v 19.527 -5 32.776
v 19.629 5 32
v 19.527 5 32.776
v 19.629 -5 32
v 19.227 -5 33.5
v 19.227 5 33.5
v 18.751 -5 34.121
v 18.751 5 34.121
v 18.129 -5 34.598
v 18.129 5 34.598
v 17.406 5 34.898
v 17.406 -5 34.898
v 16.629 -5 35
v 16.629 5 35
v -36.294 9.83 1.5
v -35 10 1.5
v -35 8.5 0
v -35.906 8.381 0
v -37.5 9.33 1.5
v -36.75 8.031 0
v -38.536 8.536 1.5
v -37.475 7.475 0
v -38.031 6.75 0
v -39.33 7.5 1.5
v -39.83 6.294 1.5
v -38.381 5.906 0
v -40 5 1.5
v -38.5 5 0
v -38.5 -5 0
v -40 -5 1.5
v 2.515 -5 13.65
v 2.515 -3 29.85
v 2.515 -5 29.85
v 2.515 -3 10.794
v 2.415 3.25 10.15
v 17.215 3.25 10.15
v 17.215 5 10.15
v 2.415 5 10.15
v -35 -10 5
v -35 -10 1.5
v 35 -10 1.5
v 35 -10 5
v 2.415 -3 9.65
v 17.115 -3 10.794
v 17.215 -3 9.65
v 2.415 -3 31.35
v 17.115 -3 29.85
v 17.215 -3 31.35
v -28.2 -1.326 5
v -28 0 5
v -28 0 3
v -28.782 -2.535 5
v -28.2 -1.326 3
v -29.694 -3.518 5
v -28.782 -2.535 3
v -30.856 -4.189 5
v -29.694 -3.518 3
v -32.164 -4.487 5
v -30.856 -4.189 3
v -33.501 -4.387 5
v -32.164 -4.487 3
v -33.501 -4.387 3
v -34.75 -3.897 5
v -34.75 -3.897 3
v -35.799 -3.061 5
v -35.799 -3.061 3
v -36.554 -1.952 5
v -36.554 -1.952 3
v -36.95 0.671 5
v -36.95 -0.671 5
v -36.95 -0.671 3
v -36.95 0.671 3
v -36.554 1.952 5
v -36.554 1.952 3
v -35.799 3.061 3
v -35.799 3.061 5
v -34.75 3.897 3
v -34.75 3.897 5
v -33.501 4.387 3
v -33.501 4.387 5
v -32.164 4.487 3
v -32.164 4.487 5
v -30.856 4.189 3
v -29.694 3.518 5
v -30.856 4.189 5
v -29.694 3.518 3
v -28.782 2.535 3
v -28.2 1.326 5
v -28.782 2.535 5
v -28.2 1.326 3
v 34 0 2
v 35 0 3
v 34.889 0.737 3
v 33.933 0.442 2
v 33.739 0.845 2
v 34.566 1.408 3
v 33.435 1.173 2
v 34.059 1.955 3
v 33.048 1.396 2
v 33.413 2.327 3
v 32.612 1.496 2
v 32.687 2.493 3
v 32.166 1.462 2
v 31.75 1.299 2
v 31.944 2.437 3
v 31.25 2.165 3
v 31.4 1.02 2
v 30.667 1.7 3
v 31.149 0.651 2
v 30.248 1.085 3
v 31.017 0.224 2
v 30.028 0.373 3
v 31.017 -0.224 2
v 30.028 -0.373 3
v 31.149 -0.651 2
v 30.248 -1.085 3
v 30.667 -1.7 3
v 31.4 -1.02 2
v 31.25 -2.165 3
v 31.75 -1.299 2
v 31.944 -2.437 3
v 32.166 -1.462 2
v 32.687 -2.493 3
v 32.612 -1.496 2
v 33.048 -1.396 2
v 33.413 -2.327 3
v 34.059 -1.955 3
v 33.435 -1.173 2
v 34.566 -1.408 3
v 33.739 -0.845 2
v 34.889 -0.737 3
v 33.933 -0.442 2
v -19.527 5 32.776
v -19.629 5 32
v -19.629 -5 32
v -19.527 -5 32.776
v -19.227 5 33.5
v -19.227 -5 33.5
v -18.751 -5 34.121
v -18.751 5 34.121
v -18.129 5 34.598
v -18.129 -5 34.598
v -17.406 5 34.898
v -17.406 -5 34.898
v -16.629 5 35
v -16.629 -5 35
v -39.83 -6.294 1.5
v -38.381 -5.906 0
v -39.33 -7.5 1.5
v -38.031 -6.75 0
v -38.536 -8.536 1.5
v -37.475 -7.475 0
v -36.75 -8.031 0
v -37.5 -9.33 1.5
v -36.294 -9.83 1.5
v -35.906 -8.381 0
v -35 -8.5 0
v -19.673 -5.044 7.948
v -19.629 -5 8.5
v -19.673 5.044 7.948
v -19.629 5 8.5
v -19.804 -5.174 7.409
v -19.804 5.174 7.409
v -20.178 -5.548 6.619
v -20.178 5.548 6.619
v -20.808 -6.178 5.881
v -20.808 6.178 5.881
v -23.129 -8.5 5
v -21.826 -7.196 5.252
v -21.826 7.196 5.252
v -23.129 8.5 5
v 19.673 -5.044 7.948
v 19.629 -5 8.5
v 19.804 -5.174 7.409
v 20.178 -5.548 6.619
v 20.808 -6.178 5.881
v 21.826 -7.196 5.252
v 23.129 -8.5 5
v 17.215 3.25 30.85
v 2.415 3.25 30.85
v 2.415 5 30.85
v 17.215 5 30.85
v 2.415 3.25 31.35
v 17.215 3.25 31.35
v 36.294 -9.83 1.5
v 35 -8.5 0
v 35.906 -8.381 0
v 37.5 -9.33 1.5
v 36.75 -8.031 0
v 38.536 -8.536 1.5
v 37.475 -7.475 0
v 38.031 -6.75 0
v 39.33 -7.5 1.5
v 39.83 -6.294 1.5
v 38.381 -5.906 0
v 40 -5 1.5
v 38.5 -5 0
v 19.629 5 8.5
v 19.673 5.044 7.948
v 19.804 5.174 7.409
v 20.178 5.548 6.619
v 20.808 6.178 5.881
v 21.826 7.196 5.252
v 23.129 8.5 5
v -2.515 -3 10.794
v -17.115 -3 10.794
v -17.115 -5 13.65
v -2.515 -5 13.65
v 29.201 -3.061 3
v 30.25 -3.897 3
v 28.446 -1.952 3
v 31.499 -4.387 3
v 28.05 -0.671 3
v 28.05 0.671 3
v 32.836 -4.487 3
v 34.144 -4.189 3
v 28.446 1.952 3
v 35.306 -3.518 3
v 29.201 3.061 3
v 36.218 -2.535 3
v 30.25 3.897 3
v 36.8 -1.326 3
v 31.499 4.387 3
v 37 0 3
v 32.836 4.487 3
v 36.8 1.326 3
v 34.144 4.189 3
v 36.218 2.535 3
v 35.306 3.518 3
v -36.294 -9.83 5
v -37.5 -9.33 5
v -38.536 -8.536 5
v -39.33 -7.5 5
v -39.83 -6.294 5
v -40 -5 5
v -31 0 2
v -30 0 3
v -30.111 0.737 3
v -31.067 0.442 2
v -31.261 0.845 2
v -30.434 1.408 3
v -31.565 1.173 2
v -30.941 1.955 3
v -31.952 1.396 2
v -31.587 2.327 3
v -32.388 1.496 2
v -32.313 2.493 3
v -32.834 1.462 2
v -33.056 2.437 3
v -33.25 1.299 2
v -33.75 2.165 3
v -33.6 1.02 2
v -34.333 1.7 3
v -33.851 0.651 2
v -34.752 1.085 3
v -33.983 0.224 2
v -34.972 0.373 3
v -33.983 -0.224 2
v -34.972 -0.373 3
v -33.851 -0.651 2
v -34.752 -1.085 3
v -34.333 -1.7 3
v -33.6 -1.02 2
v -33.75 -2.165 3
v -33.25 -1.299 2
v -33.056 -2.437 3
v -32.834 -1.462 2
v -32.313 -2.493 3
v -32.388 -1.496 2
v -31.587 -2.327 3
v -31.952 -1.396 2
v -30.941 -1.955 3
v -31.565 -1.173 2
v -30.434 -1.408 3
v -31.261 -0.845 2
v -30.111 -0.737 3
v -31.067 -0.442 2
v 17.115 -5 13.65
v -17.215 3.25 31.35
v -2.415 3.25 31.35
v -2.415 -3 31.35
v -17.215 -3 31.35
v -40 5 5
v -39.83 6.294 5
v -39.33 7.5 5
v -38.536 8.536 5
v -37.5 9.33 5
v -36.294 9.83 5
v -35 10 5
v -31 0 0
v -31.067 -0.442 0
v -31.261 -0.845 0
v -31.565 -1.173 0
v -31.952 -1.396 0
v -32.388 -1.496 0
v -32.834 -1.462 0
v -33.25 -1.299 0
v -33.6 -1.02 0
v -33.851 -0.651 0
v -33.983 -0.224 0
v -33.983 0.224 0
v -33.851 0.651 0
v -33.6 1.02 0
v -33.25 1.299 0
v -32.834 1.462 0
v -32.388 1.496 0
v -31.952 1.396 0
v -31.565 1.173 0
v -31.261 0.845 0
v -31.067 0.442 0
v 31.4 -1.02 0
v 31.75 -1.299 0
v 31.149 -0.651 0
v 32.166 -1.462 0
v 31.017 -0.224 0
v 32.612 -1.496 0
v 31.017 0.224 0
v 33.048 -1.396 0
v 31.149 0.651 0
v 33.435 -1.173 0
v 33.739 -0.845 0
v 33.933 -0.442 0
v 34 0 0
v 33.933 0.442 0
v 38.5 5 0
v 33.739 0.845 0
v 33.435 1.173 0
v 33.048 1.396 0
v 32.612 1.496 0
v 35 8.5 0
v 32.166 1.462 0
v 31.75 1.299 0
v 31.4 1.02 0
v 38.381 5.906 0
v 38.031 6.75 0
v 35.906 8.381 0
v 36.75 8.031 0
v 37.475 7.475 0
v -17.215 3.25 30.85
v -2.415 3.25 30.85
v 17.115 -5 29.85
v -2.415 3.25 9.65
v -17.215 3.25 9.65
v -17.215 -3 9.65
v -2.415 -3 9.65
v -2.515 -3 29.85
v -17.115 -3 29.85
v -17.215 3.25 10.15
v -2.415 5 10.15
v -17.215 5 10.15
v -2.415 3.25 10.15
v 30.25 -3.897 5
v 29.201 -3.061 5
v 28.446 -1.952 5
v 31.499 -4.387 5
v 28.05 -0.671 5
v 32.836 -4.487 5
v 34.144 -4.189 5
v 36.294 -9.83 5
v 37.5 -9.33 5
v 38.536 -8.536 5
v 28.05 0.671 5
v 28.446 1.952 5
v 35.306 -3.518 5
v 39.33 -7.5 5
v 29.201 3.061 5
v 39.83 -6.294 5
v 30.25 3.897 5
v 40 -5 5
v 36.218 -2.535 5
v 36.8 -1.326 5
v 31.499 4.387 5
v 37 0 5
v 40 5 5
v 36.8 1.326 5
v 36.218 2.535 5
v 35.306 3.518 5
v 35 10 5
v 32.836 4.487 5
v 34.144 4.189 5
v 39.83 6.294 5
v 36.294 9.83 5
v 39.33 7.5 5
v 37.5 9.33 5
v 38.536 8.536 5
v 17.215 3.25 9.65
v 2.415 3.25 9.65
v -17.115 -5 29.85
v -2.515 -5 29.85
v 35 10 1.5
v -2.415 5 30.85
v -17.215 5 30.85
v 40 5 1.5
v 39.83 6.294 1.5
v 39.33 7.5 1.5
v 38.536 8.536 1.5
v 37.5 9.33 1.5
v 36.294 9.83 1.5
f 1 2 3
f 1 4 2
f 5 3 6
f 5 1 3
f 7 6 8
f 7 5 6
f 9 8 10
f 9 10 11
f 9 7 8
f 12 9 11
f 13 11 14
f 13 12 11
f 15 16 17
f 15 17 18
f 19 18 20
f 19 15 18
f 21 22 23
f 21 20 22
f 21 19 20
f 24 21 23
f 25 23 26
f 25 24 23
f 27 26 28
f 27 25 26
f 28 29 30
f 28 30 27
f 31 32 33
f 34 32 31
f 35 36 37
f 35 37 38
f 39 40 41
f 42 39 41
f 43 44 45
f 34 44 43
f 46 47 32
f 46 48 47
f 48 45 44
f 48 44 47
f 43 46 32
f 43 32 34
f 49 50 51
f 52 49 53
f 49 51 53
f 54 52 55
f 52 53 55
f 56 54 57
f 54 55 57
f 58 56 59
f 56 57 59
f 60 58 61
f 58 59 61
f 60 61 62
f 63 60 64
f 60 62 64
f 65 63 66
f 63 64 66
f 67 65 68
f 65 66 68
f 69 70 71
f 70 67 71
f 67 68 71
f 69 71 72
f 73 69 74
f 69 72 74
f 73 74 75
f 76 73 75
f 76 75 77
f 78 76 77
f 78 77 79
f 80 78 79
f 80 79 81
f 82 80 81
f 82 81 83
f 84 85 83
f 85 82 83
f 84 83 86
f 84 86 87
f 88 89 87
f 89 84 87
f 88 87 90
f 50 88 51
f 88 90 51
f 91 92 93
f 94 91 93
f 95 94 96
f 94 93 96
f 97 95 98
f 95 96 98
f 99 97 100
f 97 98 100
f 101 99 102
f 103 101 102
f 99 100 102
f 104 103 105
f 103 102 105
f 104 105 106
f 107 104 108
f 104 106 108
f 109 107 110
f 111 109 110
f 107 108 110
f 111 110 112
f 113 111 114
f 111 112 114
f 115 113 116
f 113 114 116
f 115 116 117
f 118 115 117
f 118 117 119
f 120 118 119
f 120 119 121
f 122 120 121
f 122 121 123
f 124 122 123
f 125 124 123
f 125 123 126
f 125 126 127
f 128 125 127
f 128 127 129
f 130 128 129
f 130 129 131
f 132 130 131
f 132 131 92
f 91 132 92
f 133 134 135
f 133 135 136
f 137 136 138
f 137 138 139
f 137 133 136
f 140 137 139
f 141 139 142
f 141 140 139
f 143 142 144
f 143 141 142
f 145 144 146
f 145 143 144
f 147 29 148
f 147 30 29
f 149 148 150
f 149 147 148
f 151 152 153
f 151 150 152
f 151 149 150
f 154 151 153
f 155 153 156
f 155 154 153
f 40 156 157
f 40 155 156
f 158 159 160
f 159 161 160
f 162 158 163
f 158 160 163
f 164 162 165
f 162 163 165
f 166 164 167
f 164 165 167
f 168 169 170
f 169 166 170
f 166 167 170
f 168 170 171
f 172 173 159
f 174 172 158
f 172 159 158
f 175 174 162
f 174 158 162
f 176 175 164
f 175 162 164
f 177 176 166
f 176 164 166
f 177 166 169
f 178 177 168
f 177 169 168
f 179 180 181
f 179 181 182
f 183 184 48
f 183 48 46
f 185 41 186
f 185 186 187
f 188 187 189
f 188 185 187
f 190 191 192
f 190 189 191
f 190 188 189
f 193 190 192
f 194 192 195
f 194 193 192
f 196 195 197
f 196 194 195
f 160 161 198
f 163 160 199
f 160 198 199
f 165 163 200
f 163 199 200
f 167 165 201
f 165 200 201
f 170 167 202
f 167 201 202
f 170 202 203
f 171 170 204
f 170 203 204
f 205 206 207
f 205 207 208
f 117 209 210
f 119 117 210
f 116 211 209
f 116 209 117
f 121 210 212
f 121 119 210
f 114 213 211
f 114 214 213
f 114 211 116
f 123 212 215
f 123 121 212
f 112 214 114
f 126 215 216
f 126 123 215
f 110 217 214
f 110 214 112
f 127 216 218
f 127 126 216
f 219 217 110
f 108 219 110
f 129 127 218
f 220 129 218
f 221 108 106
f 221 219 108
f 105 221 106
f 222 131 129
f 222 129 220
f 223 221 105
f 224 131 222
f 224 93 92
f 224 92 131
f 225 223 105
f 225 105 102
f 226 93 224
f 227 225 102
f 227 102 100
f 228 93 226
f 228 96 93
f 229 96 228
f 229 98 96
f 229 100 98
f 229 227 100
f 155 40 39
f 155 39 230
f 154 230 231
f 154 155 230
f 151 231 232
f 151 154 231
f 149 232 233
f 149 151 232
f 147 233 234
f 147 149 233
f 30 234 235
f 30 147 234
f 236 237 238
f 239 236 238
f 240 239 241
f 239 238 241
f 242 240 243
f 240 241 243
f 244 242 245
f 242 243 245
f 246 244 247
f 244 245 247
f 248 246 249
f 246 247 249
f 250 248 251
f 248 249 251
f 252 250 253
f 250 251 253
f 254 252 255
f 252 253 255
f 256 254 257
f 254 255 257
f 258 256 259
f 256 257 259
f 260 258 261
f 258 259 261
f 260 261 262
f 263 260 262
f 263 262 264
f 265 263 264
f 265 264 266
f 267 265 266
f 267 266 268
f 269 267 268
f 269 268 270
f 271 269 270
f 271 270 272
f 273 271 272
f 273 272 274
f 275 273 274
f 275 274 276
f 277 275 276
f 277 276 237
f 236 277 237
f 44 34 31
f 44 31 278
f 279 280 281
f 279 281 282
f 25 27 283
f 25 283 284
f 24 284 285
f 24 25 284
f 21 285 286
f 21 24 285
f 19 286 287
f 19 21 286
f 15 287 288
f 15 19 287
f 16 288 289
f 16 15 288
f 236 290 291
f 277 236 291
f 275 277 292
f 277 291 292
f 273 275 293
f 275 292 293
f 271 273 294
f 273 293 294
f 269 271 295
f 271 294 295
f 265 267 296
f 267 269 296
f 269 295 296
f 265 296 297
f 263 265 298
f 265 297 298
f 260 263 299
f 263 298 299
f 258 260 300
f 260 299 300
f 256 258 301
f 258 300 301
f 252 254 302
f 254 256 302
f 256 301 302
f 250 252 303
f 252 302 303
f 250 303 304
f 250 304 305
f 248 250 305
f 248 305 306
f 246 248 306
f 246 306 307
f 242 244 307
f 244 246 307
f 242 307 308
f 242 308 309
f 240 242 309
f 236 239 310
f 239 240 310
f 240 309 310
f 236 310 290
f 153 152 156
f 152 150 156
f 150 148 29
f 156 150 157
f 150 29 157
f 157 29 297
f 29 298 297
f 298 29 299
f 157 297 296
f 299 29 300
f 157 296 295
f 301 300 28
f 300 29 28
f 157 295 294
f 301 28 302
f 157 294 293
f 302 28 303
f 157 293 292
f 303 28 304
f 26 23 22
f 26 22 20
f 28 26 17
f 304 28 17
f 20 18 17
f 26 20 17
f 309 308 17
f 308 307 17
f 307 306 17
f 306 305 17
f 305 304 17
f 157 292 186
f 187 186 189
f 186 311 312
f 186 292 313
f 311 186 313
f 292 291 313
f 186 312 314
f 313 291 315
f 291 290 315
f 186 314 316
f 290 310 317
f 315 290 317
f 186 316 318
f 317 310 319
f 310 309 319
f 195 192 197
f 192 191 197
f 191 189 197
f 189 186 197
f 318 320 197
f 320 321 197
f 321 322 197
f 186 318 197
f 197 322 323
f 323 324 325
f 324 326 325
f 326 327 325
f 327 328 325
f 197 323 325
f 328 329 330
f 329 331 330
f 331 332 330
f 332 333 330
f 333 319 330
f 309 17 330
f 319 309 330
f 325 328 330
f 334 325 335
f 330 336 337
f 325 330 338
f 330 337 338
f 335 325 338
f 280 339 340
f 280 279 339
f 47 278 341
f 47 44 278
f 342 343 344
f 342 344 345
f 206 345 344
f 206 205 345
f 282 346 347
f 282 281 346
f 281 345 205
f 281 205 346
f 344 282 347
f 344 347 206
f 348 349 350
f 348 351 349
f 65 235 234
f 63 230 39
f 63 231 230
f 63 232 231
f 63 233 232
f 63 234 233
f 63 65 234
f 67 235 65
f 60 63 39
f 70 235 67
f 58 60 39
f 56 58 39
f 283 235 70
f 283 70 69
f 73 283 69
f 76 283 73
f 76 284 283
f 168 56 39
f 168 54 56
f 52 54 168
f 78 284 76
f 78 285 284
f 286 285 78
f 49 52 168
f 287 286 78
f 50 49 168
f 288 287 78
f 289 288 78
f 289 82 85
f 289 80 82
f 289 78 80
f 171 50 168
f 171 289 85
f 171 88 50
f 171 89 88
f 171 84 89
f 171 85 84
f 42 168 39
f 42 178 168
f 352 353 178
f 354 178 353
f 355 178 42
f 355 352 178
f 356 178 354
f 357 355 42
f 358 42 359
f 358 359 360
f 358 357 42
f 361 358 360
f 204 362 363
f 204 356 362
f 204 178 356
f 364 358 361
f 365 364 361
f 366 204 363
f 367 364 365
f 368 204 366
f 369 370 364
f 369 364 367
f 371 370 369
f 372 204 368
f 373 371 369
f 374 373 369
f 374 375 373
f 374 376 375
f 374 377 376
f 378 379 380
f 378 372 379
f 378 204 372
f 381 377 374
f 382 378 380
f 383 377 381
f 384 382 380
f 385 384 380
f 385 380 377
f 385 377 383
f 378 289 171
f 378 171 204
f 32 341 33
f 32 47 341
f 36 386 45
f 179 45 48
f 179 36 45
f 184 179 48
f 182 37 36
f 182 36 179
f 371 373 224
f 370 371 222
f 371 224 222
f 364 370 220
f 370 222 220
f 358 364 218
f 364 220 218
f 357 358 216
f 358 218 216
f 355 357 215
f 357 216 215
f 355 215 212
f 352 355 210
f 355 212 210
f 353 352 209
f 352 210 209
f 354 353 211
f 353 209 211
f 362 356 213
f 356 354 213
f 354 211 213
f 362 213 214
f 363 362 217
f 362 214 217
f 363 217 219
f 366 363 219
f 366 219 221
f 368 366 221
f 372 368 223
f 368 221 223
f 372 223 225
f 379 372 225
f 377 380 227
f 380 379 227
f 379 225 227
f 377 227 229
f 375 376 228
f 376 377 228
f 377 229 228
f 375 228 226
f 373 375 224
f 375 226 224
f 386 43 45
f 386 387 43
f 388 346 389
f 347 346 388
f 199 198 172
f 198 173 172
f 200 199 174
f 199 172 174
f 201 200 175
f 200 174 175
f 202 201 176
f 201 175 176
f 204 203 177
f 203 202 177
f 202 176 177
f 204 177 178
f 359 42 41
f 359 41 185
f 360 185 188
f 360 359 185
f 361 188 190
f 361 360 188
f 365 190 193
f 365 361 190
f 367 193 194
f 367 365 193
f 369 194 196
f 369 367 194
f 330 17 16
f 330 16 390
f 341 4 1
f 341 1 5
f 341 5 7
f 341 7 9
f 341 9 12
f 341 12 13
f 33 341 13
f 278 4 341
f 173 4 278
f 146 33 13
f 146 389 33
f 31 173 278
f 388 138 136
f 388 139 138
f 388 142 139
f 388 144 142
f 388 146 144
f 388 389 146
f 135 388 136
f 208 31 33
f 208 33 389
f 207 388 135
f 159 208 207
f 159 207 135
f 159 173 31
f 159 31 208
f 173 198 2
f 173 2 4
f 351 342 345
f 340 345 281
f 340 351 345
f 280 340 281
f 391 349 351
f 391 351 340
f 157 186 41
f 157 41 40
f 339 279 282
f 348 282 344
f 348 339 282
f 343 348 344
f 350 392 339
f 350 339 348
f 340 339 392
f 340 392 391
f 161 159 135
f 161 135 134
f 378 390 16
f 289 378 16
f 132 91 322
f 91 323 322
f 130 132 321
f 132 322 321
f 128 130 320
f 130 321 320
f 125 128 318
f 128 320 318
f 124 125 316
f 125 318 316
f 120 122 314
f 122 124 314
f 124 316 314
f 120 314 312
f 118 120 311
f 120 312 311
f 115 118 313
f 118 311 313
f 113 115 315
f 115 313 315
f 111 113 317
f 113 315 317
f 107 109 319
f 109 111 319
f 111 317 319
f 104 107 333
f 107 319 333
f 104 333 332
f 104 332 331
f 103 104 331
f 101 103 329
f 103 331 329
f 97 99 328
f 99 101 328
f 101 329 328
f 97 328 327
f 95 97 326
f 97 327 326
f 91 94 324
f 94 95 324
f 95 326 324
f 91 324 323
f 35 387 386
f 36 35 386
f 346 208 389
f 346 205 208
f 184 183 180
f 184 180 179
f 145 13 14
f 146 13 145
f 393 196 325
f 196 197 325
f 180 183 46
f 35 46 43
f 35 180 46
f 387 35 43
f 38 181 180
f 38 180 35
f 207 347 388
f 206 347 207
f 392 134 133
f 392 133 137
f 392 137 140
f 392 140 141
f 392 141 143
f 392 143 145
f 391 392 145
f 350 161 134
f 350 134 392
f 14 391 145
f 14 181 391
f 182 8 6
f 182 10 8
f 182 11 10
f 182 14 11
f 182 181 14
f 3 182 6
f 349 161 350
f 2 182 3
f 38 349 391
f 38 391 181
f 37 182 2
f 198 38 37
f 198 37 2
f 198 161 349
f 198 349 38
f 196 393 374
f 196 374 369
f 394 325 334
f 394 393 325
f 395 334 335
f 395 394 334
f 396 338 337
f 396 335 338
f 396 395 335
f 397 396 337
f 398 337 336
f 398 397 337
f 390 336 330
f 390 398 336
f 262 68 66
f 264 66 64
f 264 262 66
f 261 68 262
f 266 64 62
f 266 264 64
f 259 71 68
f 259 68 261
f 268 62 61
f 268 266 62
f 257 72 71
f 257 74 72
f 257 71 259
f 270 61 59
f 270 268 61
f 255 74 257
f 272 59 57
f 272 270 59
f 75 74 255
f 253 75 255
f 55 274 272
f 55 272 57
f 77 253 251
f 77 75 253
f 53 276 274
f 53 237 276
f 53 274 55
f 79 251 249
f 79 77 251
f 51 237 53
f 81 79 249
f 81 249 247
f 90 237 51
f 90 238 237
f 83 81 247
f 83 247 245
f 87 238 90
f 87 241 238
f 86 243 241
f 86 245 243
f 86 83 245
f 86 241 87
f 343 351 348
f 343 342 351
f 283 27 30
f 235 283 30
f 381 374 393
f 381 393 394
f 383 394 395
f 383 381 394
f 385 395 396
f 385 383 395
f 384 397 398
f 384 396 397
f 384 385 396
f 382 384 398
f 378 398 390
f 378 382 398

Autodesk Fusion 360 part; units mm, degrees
sketch "Sketch1" plane through (0, 0, 0) normal (0, 0, 1) x (1, 0, 0)
  line L0 (0, 0) -> (-25, 0) construction
  line L1 (0, 0) -> (25, 0) construction
  line L2 (25, 0) -> (25, 10)
  line L3 (25, 0) -> (25, -10)
  line L4 (25, 10) -> (-25, 10)
  line L5 (-25, 10) -> (-25, 0)
  line L6 (-25, 0) -> (-25, -10)
  line L7 (-25, -10) -> (25, -10)
  line L8 (25, 10) -> (40, 10)
  line L9 (40, 10) -> (40, -10)
  line L10 (40, -10) -> (25, -10)
  line L11 (-25, 10) -> (-40, 10)
  line L12 (-40, 10) -> (-40, -10)
  line L13 (-40, -10) -> (-25, -10)
  line L14 (-40, -10) -> (-25, 10) construction
  line L15 (-40, 10) -> (-25, -10) construction
  line L16 (25, -10) -> (40, 10) construction
  line L17 (25, 10) -> (40, -10) construction
  circle A0 centre (-32.5, 0) radius 1.5
  circle A1 centre (-32.5, 0) radius 4.5
  circle A2 centre (32.5, 0) radius 1.5
  circle A3 centre (32.5, 0) radius 4.5
  dimension "d6" = 20
  dimension "d7" = 50
  dimension "d8" = 15
  dimension "d9" = 15
  dimension "d10" = 3
  dimension "d11" = 9
  dimension "d12" = 3
  dimension "d13" = 9
extrude "Extrude3" add sketch "Sketch1" along normal blind 5 contours L2 L3 L4 L5 L6 L7
extrude "Extrude2" add sketch "Sketch1" along normal blind 5 contours L2 L3 L4 L5 L6 L7 | L2 L3 L8 L9 L10 | L5 L6 L11 L12 L13
extrude "Extrude1" add sketch "Sketch1" along normal blind 3 contours L2 L3 L4 L5 L6 L7 | L2 L3 L8 L9 L10 | L5 L6 L11 L12 L13 | A1 | A3
chamfer "Chamfer4" distance 1 angle 45 2 edges at (-33.8985, 0.5424, 3) (31.1015, 0.5424, 3)
fillet "Fillet1" radius 5 4 edges at (40, 10, 2.5) (-40, 10, 2.5) (-40, -10, 2.5) (40, -10, 2.5)
sketch "Sketch2" plane through (0, 0, 5) normal (0, 0, 1) x (-1, 0, 0)
  line L0 (35, 10) -> (-35, 10)
  line L1 (-35, -10) -> (35, -10)
  line L2 (19.6294, -5) -> (-19.6294, -5)
  line L3 (-19.6294, -5) -> (-19.6294, 5)
  line L4 (-19.6294, 5) -> (19.6294, 5)
  line L5 (19.6294, 5) -> (19.6294, -5)
  line L6 (-25, -10) -> (25, -10)
  line L7 (25, 10) -> (-25, 10)
  circle A0 centre (32.5, 0) radius 4.5
  circle A1 centre (-32.5, 0) radius 4.5
  arc A2 (40, 5) -> (35, 10) centre (35, 5) ccw
  line L8 (-40, 5) -> (-40, -5)
  arc A3 (-40, -5) -> (-35, -10) centre (-35, -5) ccw
  arc A4 (35, -10) -> (40, -5) centre (35, -5) ccw
  line L9 (40, -5) -> (40, 5)
  arc A5 (-35, 10) -> (-40, 5) centre (-35, 5) ccw
  dimension "d26" = 5
  dimension "d27" = 5
extrude "Extrude4" add sketch "Sketch2" along normal blind 30 contours L2 L3 L4 L5
fillet "Fillet4" radius 3.5 4 edges at (19.6294, 0, 5) (-19.6294, 0, 5) (0, 5, 5) (0, -5, 5)
fillet "Fillet5" radius 3 2 edges at (-19.6294, 0, 35) (19.6294, 0, 35)
sketch "Sketch3" plane through (0, 5, 0) normal (0, 1, 0) x (-1, 0, 0)
  line L0 (-19.6294, 8.5) -> (19.6294, 8.5)
  line L1 (19.6294, 8.5) -> (19.6294, 32)
  line L2 (16.6294, 35) -> (-16.6294, 35)
  line L3 (-19.6294, 32) -> (-19.6294, 8.5)
  line L4 (0, 35) -> (0, 0) construction
  line L5 (-17.1147, 29.85) -> (-2.5147, 29.85)
  line L6 (-2.5147, 29.85) -> (-2.5147, 13.65)
  line L7 (-2.5147, 13.65) -> (-17.1147, 13.65)
  line L8 (-17.1147, 13.65) -> (-17.1147, 29.85)
  line L9 (2.5147, 29.85) -> (17.1147, 29.85)
  line L10 (17.1147, 29.85) -> (17.1147, 13.65)
  line L11 (17.1147, 13.65) -> (2.5147, 13.65)
  line L12 (2.5147, 13.65) -> (2.5147, 29.85)
  line L13 (-2.5147, 29.85) -> (0, 29.85) construction
  line L14 (-17.1147, 29.85) -> (-19.6294, 29.85) construction
  line L15 (-2.5147, 29.85) -> (-2.5147, 35) construction
  line L16 (-17.1147, 13.65) -> (-17.1147, 8.5) construction
  line L17 (2.5147, 29.85) -> (2.5147, 35) construction
  line L18 (17.1147, 13.65) -> (17.1147, 8.5) construction
  line L19 (0, 29.85) -> (2.5147, 29.85) construction
  line L20 (17.1147, 13.65) -> (19.6294, 13.65) construction
  arc A0 (-16.6294, 35) -> (-19.6294, 32) centre (-16.6294, 32) ccw
  arc A1 (19.6294, 32) -> (16.6294, 35) centre (16.6294, 32) ccw
  dimension "d31" = 14.6
  dimension "d32" = 16.2
extrude "Extrude5" cut sketch "Sketch3" against normal blind 10 contours L5 L6 L7 L8 | L9 L10 L11 L12
sketch "Sketch4" plane through (0, 5, 0) normal (0, 1, 0) x (-1, 0, 0)
  line L0 (-2.5147, 29.85) -> (-2.5147, 13.65)
  line L1 (-2.5147, 13.65) -> (-17.1147, 13.65)
  line L2 (-17.1147, 13.65) -> (-17.1147, 29.85)
  line L3 (-17.1147, 29.85) -> (-2.5147, 29.85)
  line L4 (17.1147, 29.85) -> (17.1147, 13.65)
  line L5 (17.1147, 13.65) -> (2.5147, 13.65)
  line L6 (2.5147, 13.65) -> (2.5147, 29.85)
  line L7 (2.5147, 29.85) -> (17.1147, 29.85)
  arc A0 (-16.6294, 35) -> (-19.6294, 32) centre (-16.6294, 32) ccw
  line L8 (-19.6294, 32) -> (-19.6294, 8.5)
  line L9 (-19.6294, 8.5) -> (19.6294, 8.5)
  line L10 (19.6294, 8.5) -> (19.6294, 32)
  arc A1 (19.6294, 32) -> (16.6294, 35) centre (16.6294, 32) ccw
  line L11 (16.6294, 35) -> (-16.6294, 35)
  line L12 (-2.5147, 29.85) -> (-2.5147, 13.65)
  line L13 (-17.1147, 29.85) -> (-2.5147, 29.85)
  line L14 (-17.1147, 13.65) -> (-17.1147, 29.85)
  line L15 (-2.5147, 13.65) -> (-17.1147, 13.65)
  line L16 (17.1147, 29.85) -> (17.1147, 13.65)
  line L17 (17.1147, 13.65) -> (2.5147, 13.65)
  line L18 (2.5147, 13.65) -> (2.5147, 29.85)
  line L19 (2.5147, 29.85) -> (17.1147, 29.85)
  line L20 (-17.2147, 31.35) -> (-2.4147, 31.35)
  line L21 (-2.4147, 31.35) -> (-2.4147, 9.65)
  line L22 (-2.4147, 9.65) -> (-17.2147, 9.65)
  line L23 (-17.2147, 9.65) -> (-17.2147, 31.35)
  line L24 (2.4147, 31.35) -> (17.2147, 31.35)
  line L25 (17.2147, 31.35) -> (17.2147, 9.65)
  line L26 (17.2147, 9.65) -> (2.4147, 9.65)
  line L27 (2.4147, 9.65) -> (2.4147, 31.35)
  dimension "d38" = 4
  dimension "d39" = 0.1
  dimension "d40" = 0.1
  dimension "d41" = 1.5
  dimension "d42" = 0.1
  dimension "d43" = 0.1
  dimension "d44" = 4
  dimension "d45" = 1.5
extrude "Extrude6" cut sketch "Sketch4" against normal blind 8 contours L20 L21 L22 L23 | L24 L25 L26 L27
sketch "Sketch5" plane through (0, 0, 9.65) normal (0, 0, 1) x (-1, 0, 0)
  line L0 (-17.2147, -5) -> (-2.4147, -5)
  line L1 (-2.4147, -5) -> (-2.4147, 3)
  line L2 (-2.4147, 3) -> (-17.2147, 3)
  line L3 (-17.2147, 3) -> (-17.2147, -5)
  line L4 (-17.1147, 3) -> (-2.5147, 3)
  line L5 (-2.5147, 3) -> (-2.5147, 5)
  line L6 (-2.5147, 5) -> (-17.1147, 5)
  line L7 (-17.1147, 5) -> (-17.1147, 3)
  line L8 (2.4147, -5) -> (17.2147, -5)
  line L9 (17.2147, -5) -> (17.2147, 3)
  line L10 (17.2147, 3) -> (2.4147, 3)
  line L11 (2.4147, 3) -> (2.4147, -5)
  line L12 (2.5147, 3) -> (17.1147, 3)
  line L13 (17.1147, 3) -> (17.1147, 5)
  line L14 (17.1147, 5) -> (2.5147, 5)
  line L15 (2.5147, 5) -> (2.5147, 3)
  line L16 (2.4147, -3.25) -> (17.2147, -3.25)
  line L17 (-2.4147, -3.25) -> (-17.2147, -3.25)
  dimension "d49" = 8.25
  dimension "d50" = 8.25
extrude "Extrude7" add sketch "Sketch5" along normal blind 0.5 contours L0 L1 L3 L17 | L8 L9 L11 L16
sketch "Sketch6" plane through (0, 0, 31.35) normal (0, 0, -1) x (1, 0, 0)
  line L0 (2.4147, -5) -> (17.2147, -5)
  line L1 (17.2147, -5) -> (17.2147, 3)
  line L2 (17.2147, 3) -> (2.4147, 3)
  line L3 (2.4147, 3) -> (2.4147, -5)
  line L4 (-2.4147, -5) -> (-17.2147, -5)
  line L5 (-17.2147, -5) -> (-17.2147, -3.25)
  line L6 (-17.2147, -3.25) -> (-2.4147, -3.25)
  line L7 (-2.4147, -3.25) -> (-2.4147, -5)
  line L8 (2.4147, -3.25) -> (17.2147, -3.25)
  line L9 (17.2147, -3.25) -> (17.2147, -5)
  line L10 (17.2147, -5) -> (2.4147, -5)
  line L11 (2.4147, -5) -> (2.4147, -3.25)
extrude "Extrude8" add sketch "Sketch6" along normal blind 0.5 contours L0 L1 L3 L8 L9 L10 L11 | L4 L5 L6 L7
chamfer "Chamfer2" distance 2 angle 55 2 edges at (9.8147, -3, 13.65) (-9.8147, -3, 13.65) measured on face at (7.3814, -3.6667, 13.65) measured on face at (-12.2481, -3.6667, 13.65)
chamfer "Chamfer3" distance 1.5 angle 45 8 edges at (40, 0, 0) (38.5355, 8.5355, 0) (0, 10, 0) (-38.5355, 8.5355, 0) (-40, 0, 0) (-38.5355, -8.5355, 0) (0, -10, 0) (38.5355, -8.5355, 0)
